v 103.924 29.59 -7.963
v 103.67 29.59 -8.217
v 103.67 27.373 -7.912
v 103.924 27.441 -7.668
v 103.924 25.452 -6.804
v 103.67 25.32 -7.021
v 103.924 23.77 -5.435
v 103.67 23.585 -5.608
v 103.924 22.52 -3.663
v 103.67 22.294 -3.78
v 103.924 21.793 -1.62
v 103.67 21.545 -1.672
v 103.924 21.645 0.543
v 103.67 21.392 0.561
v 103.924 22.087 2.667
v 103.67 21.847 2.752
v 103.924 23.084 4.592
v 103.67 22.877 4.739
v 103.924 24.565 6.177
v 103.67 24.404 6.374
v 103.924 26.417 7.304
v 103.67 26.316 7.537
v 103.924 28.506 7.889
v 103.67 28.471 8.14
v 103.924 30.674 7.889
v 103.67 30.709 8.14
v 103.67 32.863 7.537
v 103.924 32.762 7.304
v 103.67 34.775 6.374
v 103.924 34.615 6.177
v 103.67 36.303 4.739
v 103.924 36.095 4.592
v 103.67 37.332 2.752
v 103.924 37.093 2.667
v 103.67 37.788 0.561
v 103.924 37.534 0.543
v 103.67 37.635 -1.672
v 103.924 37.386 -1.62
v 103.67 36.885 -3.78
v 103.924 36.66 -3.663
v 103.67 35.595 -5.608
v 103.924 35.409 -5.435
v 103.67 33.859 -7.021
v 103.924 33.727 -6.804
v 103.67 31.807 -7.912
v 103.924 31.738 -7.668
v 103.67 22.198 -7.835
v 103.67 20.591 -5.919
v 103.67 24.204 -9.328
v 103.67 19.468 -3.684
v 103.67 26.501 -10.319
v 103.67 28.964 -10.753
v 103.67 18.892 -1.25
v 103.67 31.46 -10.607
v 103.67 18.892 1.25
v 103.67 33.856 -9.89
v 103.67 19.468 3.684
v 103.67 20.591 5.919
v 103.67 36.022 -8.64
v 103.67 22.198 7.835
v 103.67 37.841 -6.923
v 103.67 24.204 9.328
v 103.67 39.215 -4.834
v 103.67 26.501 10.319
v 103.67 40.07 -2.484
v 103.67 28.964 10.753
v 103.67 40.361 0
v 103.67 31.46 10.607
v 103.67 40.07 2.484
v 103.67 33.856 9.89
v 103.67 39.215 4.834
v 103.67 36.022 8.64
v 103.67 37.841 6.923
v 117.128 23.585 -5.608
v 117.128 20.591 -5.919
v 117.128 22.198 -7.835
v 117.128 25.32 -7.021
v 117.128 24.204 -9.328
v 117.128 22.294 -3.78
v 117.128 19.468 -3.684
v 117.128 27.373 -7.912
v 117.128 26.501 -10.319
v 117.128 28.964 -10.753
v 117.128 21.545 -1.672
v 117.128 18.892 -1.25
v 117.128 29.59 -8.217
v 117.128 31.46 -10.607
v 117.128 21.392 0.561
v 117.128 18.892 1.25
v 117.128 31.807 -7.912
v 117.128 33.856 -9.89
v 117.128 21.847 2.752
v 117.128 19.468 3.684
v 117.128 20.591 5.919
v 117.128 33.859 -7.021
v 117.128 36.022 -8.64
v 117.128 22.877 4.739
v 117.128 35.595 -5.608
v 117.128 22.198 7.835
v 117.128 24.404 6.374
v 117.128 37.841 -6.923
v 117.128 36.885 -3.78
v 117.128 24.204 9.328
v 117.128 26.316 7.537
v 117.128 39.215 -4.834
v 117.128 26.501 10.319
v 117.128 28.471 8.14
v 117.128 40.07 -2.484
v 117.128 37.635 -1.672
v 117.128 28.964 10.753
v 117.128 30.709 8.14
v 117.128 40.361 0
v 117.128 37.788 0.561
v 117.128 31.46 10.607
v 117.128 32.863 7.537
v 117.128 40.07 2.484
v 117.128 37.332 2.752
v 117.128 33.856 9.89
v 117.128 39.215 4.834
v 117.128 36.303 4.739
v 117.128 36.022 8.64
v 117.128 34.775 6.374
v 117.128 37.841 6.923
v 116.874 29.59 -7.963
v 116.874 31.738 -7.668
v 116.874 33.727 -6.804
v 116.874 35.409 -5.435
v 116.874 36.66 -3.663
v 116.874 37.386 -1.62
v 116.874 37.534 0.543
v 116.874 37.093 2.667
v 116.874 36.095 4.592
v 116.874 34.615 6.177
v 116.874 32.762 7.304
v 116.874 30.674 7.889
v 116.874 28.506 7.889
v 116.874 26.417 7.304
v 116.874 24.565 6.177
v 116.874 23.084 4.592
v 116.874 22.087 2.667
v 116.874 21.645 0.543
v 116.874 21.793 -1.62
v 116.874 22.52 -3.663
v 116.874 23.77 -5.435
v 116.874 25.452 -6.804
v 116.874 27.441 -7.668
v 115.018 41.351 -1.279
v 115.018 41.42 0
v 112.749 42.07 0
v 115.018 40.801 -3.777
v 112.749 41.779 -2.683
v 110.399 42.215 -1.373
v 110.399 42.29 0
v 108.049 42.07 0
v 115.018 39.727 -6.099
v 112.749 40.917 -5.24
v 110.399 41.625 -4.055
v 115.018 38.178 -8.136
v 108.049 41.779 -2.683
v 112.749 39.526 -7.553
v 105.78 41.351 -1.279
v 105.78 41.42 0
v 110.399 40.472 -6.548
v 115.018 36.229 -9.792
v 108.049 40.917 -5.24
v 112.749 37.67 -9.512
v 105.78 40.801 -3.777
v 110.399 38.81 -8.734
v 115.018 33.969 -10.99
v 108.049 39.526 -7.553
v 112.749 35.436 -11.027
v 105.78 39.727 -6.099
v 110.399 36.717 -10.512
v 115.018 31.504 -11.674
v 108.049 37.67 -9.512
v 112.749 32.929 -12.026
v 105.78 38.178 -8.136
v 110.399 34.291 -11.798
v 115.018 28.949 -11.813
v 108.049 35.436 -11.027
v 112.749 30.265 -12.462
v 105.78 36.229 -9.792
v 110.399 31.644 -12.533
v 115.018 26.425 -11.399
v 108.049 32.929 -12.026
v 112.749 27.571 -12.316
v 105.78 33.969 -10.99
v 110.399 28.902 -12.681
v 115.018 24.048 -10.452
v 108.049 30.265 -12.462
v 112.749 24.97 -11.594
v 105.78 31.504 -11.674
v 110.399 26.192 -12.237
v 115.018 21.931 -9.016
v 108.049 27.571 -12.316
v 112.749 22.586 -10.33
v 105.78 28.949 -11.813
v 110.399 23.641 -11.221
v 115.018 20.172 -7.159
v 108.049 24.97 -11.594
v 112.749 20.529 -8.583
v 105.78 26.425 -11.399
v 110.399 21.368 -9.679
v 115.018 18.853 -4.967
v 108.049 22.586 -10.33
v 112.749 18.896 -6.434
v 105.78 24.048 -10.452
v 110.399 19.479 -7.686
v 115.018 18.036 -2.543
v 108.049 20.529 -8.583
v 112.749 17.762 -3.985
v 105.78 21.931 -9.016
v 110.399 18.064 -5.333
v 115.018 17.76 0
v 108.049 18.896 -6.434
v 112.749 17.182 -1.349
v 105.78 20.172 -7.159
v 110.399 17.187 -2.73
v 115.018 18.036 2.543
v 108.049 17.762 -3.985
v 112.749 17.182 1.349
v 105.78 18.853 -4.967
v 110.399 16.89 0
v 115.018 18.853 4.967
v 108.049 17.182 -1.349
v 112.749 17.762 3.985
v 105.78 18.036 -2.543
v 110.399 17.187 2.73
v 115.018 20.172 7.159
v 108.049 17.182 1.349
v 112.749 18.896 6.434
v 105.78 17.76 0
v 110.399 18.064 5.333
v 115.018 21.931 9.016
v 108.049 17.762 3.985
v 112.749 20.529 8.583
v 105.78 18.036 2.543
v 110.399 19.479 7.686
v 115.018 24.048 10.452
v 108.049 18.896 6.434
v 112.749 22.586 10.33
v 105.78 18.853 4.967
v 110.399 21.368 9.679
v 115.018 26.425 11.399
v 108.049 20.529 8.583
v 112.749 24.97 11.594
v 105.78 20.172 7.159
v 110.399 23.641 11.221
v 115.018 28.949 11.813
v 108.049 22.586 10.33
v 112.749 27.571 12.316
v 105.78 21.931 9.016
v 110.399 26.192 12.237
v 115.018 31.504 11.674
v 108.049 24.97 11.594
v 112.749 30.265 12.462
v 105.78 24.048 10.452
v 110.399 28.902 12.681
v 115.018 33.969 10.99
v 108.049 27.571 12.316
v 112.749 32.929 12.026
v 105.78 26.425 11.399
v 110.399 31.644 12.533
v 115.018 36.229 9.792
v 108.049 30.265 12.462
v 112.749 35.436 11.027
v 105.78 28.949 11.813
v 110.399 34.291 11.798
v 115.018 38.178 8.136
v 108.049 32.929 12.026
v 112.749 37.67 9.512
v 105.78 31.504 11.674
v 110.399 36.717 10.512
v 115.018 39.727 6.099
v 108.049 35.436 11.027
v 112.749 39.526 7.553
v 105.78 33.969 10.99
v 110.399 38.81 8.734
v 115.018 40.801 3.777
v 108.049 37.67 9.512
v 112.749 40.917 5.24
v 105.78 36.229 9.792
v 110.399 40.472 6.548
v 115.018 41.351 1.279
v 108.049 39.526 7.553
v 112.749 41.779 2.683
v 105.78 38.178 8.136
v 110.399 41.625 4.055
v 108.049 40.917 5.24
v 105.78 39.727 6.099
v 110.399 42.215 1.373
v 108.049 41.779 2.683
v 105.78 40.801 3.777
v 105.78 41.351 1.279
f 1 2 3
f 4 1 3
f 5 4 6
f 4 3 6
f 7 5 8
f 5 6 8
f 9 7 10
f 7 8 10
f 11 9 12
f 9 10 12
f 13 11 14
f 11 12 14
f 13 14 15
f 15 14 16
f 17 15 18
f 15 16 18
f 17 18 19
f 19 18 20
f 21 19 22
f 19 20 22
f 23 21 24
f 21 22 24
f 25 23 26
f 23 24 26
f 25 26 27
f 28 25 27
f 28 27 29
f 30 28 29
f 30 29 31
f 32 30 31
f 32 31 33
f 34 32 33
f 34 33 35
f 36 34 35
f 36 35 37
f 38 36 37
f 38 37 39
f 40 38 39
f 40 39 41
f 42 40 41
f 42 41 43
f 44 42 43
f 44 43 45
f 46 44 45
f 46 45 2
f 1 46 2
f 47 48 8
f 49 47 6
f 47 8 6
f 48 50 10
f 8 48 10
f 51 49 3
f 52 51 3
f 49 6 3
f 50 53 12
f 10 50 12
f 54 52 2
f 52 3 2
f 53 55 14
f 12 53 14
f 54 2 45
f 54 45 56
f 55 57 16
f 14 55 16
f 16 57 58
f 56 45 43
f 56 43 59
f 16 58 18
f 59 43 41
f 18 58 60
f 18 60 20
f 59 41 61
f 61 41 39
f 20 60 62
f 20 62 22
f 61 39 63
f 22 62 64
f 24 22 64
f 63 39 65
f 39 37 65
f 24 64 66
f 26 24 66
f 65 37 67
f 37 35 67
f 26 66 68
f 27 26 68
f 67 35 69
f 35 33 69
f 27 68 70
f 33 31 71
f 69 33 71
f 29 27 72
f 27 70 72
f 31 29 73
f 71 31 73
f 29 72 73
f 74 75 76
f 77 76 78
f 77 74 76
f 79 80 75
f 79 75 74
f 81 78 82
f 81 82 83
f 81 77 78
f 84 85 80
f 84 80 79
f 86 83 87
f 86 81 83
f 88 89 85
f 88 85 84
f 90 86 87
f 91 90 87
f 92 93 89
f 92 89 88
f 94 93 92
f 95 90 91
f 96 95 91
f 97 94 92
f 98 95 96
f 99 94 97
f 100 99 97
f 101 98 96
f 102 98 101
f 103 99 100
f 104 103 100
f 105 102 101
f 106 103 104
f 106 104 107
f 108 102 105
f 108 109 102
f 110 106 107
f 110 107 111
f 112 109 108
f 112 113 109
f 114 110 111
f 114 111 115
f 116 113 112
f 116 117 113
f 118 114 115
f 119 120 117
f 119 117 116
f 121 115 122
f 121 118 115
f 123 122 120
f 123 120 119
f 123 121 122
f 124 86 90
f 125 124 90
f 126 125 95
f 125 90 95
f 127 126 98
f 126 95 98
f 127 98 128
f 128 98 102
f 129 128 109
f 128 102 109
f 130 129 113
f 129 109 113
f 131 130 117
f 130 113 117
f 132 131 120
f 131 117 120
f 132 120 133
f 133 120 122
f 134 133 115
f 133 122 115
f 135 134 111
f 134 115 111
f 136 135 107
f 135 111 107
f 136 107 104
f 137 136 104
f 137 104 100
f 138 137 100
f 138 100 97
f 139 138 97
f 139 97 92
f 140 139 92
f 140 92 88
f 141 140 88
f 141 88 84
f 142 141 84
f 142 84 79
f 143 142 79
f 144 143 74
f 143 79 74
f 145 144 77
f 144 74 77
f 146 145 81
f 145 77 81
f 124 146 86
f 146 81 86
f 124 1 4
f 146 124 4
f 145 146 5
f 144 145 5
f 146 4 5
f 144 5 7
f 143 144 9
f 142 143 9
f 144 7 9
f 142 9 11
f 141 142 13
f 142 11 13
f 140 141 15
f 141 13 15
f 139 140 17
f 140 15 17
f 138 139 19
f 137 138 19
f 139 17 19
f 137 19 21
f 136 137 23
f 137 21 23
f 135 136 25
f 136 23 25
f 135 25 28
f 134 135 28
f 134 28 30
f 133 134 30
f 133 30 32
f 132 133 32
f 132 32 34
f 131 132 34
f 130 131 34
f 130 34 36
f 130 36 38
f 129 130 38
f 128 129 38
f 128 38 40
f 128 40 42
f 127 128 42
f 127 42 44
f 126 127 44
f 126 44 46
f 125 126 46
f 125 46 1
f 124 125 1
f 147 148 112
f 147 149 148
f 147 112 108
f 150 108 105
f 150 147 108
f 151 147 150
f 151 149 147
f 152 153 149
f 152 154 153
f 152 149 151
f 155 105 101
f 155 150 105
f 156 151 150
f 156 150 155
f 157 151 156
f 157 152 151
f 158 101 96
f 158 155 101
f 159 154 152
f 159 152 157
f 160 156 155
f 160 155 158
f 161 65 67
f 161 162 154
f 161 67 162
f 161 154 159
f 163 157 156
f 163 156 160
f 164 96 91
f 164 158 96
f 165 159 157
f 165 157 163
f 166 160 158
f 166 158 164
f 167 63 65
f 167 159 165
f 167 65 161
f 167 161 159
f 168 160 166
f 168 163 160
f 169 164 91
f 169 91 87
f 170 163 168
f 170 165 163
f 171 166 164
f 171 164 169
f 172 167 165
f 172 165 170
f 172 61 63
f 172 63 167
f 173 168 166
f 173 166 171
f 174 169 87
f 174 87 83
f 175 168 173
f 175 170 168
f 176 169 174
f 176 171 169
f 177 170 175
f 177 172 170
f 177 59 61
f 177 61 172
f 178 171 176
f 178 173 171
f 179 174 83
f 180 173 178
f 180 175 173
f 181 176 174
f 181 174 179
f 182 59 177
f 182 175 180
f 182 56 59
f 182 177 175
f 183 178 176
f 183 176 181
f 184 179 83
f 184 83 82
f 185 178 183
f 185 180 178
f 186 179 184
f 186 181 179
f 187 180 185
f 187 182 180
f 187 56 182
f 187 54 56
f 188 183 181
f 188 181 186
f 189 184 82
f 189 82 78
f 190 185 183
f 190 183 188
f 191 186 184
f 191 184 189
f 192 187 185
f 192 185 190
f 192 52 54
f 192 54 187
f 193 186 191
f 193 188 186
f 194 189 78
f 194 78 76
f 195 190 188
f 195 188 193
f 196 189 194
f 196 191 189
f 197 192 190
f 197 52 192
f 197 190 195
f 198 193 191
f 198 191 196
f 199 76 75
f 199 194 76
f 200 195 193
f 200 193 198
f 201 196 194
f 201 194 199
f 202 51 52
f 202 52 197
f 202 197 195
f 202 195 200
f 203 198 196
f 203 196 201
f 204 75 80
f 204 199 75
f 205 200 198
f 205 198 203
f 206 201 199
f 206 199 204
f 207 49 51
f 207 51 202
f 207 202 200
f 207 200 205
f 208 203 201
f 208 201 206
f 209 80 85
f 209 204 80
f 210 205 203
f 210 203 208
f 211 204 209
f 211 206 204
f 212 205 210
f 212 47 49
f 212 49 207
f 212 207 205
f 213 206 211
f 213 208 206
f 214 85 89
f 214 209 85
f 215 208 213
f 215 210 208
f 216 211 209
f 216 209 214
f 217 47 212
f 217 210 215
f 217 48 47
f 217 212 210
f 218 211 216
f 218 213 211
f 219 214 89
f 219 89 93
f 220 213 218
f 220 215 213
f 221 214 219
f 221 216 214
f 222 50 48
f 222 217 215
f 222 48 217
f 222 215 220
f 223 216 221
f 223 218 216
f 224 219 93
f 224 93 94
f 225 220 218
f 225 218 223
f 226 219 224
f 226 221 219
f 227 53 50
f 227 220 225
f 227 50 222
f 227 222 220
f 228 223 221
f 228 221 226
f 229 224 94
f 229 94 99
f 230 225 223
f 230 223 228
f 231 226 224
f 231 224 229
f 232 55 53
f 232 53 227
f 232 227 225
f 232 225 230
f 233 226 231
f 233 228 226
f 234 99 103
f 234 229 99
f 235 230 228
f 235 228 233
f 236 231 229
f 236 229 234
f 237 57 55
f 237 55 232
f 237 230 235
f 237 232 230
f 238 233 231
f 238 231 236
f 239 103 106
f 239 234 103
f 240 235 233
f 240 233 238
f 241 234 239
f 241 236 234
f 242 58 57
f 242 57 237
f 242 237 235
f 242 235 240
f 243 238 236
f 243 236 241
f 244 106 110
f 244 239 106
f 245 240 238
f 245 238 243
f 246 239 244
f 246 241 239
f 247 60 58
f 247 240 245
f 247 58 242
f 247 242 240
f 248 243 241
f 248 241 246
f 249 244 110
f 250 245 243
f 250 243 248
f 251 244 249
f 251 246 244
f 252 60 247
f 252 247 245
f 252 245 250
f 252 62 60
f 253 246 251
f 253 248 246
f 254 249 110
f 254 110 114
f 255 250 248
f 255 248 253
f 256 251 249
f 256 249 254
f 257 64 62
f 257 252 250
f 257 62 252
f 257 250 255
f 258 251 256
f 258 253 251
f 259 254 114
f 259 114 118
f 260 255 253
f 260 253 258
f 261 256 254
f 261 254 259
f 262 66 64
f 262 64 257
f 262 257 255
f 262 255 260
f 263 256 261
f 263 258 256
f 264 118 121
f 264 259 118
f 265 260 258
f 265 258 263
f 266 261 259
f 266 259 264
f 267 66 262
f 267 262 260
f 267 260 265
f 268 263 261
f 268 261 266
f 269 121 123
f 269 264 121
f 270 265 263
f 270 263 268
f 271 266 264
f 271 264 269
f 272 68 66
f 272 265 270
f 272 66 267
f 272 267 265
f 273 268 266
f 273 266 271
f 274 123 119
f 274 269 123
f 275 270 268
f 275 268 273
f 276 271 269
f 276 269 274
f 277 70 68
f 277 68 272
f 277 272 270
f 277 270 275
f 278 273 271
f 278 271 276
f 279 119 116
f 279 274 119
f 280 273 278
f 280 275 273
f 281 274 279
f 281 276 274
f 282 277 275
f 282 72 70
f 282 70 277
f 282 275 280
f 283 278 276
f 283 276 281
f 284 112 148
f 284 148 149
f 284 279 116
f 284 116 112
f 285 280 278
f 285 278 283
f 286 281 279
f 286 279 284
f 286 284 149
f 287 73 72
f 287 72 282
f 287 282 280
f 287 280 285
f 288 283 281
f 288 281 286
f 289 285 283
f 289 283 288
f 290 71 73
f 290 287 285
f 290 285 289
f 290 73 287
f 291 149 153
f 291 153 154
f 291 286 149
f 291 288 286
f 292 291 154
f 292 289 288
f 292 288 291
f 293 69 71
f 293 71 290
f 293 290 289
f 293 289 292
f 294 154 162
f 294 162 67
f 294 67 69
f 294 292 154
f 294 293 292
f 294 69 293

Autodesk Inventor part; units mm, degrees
ref_plane "YZ Plane" through (0, 0, 0) normal (1, 0, 0) x (0, 1, 0)
ref_plane "XZ Plane" through (0, 0, 0) normal (0, 1, 0) x (-1, 0, 0)
ref_plane "XY Plane" through (0, 0, 0) normal (0, 0, 1) x (1, 0, 0)
sketch "Sketch1" plane through (0, 0, 0) normal (0, 0, 1) x (1, 0, 0)
  arc A0 (103.6702, 18.7694) -> (117.1276, 18.7694) centre (110.3989, 29.5404) ccw
  line L0 (103.6702, 40.3608) -> (103.6702, 29.5898)
  line L1 (117.1276, 40.3608) -> (117.1276, 29.5898)
  line L2 (95.2163, 29.5898) -> (125.5815, 29.5898)
  arc A1 (117.1276, 40.3608) -> (103.6702, 40.3608) centre (110.3989, 29.5898) ccw
  point P0 (0, 0)
  point P1 (110.3989, 16.8404)
  dimension "d44" = 21.6408
  dimension "d45" = 12.7
  dimension "d46" = 12.7
revolve "Revolution1" add sketch "Sketch1" angle 360 about axis through (95.2163, 29.5898, 0) along (1, 0, 0)
sketch "Sketch2" plane through (117.1276, 29.5898, 0) normal (1, 0, 0) x (0, 0, -1)
  circle A0 centre (0, 0) radius 10.771 projected
  point P0 (0, -29.5898)
hole "Hole1" at (117.1276, 29.5898, 0) direction (-1, 0, 0) diameter 15.9258 depth 25.4 tip angle 118
chamfer "Chamfer1" distance 0.254 angle 45 2 edges at (117.1276, 29.5898, 7.9629) (103.6702, 29.5898, 7.9629)
equation "\"d45\" = d46"
properties part number "1410P"
